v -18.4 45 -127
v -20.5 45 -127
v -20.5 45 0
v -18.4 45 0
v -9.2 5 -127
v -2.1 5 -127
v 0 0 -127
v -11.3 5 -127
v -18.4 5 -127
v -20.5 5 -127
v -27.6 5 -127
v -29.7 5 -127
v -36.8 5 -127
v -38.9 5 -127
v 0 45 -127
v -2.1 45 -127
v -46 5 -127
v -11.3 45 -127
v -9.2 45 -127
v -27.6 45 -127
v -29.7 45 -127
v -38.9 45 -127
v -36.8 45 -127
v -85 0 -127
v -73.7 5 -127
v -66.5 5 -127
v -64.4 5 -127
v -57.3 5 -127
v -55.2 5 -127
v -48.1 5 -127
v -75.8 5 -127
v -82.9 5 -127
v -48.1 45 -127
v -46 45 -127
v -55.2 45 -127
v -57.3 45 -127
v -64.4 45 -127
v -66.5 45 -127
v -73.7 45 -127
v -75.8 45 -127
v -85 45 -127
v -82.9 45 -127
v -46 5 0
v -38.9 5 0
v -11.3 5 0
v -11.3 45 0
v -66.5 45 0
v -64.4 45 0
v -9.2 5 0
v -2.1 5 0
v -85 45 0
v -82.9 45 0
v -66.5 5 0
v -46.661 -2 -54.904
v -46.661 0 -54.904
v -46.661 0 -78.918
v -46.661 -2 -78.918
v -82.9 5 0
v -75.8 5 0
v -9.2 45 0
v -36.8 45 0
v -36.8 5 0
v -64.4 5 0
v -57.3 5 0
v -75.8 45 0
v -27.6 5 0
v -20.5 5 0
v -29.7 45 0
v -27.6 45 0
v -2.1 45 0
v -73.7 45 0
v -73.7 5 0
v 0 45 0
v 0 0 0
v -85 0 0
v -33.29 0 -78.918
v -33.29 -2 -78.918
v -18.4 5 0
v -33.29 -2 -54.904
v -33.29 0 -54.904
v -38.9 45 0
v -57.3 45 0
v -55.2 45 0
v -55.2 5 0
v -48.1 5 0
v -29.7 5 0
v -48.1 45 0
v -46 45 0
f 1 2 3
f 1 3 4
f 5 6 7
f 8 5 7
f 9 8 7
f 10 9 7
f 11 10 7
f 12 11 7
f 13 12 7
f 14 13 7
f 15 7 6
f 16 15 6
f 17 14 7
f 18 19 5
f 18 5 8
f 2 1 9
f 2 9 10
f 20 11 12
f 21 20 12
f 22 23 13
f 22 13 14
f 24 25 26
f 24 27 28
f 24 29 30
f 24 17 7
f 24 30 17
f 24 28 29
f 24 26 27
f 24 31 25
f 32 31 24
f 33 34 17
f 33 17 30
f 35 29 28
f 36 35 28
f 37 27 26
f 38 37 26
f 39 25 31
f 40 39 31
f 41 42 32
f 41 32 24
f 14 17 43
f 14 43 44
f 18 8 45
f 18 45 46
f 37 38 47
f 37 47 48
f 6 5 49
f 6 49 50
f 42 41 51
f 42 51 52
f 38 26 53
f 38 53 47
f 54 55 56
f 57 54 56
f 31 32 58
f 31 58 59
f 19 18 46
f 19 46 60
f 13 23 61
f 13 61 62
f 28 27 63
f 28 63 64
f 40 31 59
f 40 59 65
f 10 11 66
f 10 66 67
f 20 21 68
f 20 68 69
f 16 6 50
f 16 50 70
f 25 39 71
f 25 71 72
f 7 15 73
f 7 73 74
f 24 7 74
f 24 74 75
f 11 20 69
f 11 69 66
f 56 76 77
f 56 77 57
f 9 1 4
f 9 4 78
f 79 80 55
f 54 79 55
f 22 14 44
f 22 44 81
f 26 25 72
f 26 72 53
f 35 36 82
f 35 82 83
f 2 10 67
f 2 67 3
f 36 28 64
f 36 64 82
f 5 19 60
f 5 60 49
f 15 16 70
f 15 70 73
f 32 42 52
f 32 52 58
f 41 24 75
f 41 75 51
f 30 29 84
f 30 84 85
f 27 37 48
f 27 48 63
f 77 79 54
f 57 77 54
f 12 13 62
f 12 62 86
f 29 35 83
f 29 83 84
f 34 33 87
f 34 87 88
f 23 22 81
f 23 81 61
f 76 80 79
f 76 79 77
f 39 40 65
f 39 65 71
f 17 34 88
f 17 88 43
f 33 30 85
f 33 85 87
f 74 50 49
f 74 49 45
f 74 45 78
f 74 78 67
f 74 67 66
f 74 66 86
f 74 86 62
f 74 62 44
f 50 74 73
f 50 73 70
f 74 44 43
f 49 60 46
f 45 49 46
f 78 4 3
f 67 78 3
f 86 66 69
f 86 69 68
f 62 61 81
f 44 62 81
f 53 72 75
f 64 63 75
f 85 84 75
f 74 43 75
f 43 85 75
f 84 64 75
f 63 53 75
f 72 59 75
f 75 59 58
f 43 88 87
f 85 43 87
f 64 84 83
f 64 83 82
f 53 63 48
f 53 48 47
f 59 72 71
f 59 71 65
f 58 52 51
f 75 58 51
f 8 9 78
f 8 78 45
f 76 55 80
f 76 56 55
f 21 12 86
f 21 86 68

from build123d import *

# Parameters (mm, degrees)
BOSS_EXTRUDE1_DEPTH = 127
SKETCH4_W           = 13.371208708
SKETCH4_H           = 24.013599311
THERMAL_PASTE_DEPTH = 2


with BuildPart() as part:
    # Sketch1 → Boss-Extrude1 (new body)
    with BuildSketch(Plane(origin=(0, 0, -127), x_dir=(-1, 0, 0), z_dir=(0, 0, -1))):
        Polygon((85, 45), (82.9, 45), (82.9, 5), (75.8, 5), (75.8, 45), (73.7, 45), (73.7, 5), (66.5, 5), (66.5, 45), (64.4, 45), (64.4, 5), (57.3, 5), (57.3, 45), (55.2, 45), (55.2, 5), (48.1, 5), (48.1, 45), (46, 45), (46, 5), (38.9, 5), (38.9, 45), (36.8, 45), (36.8, 5), (29.7, 5), (29.7, 45), (27.6, 45), (27.6, 5), (20.5, 5), (20.5, 45), (18.4, 45), (18.4, 5), (11.3, 5), (11.3, 45), (9.2, 45), (9.2, 5), (2.1, 5), (2.1, 45), (0, 45), (0, 0), (85, 0), align=None)
    extrude(amount=-BOSS_EXTRUDE1_DEPTH)

    # Sketch4 → thermal-paste (add)
    with BuildSketch(Plane(origin=(0, 0, 0), x_dir=(-1, 0, 0), z_dir=(0, -1, 0))):
        with Locations((39.975843254, 66.911022629)):
            Rectangle(SKETCH4_W, SKETCH4_H)
    extrude(amount=THERMAL_PASTE_DEPTH)


with BuildPart() as body_2:
    # Split1: the piece on the far side of the plane
    add(part.part)
    split(bisect_by=Plane(origin=(0, 0, 0), x_dir=(0, 0, -1), z_dir=(0, -1, 0)), keep=Keep.BOTTOM)


with BuildPart() as part_1:
    add(part.part)

    # Split1
    split(bisect_by=Plane(origin=(0, 0, 0), x_dir=(0, 0, -1), z_dir=(0, -1, 0)), keep=Keep.TOP)


solid = Compound([body_2.part, part_1.part])
